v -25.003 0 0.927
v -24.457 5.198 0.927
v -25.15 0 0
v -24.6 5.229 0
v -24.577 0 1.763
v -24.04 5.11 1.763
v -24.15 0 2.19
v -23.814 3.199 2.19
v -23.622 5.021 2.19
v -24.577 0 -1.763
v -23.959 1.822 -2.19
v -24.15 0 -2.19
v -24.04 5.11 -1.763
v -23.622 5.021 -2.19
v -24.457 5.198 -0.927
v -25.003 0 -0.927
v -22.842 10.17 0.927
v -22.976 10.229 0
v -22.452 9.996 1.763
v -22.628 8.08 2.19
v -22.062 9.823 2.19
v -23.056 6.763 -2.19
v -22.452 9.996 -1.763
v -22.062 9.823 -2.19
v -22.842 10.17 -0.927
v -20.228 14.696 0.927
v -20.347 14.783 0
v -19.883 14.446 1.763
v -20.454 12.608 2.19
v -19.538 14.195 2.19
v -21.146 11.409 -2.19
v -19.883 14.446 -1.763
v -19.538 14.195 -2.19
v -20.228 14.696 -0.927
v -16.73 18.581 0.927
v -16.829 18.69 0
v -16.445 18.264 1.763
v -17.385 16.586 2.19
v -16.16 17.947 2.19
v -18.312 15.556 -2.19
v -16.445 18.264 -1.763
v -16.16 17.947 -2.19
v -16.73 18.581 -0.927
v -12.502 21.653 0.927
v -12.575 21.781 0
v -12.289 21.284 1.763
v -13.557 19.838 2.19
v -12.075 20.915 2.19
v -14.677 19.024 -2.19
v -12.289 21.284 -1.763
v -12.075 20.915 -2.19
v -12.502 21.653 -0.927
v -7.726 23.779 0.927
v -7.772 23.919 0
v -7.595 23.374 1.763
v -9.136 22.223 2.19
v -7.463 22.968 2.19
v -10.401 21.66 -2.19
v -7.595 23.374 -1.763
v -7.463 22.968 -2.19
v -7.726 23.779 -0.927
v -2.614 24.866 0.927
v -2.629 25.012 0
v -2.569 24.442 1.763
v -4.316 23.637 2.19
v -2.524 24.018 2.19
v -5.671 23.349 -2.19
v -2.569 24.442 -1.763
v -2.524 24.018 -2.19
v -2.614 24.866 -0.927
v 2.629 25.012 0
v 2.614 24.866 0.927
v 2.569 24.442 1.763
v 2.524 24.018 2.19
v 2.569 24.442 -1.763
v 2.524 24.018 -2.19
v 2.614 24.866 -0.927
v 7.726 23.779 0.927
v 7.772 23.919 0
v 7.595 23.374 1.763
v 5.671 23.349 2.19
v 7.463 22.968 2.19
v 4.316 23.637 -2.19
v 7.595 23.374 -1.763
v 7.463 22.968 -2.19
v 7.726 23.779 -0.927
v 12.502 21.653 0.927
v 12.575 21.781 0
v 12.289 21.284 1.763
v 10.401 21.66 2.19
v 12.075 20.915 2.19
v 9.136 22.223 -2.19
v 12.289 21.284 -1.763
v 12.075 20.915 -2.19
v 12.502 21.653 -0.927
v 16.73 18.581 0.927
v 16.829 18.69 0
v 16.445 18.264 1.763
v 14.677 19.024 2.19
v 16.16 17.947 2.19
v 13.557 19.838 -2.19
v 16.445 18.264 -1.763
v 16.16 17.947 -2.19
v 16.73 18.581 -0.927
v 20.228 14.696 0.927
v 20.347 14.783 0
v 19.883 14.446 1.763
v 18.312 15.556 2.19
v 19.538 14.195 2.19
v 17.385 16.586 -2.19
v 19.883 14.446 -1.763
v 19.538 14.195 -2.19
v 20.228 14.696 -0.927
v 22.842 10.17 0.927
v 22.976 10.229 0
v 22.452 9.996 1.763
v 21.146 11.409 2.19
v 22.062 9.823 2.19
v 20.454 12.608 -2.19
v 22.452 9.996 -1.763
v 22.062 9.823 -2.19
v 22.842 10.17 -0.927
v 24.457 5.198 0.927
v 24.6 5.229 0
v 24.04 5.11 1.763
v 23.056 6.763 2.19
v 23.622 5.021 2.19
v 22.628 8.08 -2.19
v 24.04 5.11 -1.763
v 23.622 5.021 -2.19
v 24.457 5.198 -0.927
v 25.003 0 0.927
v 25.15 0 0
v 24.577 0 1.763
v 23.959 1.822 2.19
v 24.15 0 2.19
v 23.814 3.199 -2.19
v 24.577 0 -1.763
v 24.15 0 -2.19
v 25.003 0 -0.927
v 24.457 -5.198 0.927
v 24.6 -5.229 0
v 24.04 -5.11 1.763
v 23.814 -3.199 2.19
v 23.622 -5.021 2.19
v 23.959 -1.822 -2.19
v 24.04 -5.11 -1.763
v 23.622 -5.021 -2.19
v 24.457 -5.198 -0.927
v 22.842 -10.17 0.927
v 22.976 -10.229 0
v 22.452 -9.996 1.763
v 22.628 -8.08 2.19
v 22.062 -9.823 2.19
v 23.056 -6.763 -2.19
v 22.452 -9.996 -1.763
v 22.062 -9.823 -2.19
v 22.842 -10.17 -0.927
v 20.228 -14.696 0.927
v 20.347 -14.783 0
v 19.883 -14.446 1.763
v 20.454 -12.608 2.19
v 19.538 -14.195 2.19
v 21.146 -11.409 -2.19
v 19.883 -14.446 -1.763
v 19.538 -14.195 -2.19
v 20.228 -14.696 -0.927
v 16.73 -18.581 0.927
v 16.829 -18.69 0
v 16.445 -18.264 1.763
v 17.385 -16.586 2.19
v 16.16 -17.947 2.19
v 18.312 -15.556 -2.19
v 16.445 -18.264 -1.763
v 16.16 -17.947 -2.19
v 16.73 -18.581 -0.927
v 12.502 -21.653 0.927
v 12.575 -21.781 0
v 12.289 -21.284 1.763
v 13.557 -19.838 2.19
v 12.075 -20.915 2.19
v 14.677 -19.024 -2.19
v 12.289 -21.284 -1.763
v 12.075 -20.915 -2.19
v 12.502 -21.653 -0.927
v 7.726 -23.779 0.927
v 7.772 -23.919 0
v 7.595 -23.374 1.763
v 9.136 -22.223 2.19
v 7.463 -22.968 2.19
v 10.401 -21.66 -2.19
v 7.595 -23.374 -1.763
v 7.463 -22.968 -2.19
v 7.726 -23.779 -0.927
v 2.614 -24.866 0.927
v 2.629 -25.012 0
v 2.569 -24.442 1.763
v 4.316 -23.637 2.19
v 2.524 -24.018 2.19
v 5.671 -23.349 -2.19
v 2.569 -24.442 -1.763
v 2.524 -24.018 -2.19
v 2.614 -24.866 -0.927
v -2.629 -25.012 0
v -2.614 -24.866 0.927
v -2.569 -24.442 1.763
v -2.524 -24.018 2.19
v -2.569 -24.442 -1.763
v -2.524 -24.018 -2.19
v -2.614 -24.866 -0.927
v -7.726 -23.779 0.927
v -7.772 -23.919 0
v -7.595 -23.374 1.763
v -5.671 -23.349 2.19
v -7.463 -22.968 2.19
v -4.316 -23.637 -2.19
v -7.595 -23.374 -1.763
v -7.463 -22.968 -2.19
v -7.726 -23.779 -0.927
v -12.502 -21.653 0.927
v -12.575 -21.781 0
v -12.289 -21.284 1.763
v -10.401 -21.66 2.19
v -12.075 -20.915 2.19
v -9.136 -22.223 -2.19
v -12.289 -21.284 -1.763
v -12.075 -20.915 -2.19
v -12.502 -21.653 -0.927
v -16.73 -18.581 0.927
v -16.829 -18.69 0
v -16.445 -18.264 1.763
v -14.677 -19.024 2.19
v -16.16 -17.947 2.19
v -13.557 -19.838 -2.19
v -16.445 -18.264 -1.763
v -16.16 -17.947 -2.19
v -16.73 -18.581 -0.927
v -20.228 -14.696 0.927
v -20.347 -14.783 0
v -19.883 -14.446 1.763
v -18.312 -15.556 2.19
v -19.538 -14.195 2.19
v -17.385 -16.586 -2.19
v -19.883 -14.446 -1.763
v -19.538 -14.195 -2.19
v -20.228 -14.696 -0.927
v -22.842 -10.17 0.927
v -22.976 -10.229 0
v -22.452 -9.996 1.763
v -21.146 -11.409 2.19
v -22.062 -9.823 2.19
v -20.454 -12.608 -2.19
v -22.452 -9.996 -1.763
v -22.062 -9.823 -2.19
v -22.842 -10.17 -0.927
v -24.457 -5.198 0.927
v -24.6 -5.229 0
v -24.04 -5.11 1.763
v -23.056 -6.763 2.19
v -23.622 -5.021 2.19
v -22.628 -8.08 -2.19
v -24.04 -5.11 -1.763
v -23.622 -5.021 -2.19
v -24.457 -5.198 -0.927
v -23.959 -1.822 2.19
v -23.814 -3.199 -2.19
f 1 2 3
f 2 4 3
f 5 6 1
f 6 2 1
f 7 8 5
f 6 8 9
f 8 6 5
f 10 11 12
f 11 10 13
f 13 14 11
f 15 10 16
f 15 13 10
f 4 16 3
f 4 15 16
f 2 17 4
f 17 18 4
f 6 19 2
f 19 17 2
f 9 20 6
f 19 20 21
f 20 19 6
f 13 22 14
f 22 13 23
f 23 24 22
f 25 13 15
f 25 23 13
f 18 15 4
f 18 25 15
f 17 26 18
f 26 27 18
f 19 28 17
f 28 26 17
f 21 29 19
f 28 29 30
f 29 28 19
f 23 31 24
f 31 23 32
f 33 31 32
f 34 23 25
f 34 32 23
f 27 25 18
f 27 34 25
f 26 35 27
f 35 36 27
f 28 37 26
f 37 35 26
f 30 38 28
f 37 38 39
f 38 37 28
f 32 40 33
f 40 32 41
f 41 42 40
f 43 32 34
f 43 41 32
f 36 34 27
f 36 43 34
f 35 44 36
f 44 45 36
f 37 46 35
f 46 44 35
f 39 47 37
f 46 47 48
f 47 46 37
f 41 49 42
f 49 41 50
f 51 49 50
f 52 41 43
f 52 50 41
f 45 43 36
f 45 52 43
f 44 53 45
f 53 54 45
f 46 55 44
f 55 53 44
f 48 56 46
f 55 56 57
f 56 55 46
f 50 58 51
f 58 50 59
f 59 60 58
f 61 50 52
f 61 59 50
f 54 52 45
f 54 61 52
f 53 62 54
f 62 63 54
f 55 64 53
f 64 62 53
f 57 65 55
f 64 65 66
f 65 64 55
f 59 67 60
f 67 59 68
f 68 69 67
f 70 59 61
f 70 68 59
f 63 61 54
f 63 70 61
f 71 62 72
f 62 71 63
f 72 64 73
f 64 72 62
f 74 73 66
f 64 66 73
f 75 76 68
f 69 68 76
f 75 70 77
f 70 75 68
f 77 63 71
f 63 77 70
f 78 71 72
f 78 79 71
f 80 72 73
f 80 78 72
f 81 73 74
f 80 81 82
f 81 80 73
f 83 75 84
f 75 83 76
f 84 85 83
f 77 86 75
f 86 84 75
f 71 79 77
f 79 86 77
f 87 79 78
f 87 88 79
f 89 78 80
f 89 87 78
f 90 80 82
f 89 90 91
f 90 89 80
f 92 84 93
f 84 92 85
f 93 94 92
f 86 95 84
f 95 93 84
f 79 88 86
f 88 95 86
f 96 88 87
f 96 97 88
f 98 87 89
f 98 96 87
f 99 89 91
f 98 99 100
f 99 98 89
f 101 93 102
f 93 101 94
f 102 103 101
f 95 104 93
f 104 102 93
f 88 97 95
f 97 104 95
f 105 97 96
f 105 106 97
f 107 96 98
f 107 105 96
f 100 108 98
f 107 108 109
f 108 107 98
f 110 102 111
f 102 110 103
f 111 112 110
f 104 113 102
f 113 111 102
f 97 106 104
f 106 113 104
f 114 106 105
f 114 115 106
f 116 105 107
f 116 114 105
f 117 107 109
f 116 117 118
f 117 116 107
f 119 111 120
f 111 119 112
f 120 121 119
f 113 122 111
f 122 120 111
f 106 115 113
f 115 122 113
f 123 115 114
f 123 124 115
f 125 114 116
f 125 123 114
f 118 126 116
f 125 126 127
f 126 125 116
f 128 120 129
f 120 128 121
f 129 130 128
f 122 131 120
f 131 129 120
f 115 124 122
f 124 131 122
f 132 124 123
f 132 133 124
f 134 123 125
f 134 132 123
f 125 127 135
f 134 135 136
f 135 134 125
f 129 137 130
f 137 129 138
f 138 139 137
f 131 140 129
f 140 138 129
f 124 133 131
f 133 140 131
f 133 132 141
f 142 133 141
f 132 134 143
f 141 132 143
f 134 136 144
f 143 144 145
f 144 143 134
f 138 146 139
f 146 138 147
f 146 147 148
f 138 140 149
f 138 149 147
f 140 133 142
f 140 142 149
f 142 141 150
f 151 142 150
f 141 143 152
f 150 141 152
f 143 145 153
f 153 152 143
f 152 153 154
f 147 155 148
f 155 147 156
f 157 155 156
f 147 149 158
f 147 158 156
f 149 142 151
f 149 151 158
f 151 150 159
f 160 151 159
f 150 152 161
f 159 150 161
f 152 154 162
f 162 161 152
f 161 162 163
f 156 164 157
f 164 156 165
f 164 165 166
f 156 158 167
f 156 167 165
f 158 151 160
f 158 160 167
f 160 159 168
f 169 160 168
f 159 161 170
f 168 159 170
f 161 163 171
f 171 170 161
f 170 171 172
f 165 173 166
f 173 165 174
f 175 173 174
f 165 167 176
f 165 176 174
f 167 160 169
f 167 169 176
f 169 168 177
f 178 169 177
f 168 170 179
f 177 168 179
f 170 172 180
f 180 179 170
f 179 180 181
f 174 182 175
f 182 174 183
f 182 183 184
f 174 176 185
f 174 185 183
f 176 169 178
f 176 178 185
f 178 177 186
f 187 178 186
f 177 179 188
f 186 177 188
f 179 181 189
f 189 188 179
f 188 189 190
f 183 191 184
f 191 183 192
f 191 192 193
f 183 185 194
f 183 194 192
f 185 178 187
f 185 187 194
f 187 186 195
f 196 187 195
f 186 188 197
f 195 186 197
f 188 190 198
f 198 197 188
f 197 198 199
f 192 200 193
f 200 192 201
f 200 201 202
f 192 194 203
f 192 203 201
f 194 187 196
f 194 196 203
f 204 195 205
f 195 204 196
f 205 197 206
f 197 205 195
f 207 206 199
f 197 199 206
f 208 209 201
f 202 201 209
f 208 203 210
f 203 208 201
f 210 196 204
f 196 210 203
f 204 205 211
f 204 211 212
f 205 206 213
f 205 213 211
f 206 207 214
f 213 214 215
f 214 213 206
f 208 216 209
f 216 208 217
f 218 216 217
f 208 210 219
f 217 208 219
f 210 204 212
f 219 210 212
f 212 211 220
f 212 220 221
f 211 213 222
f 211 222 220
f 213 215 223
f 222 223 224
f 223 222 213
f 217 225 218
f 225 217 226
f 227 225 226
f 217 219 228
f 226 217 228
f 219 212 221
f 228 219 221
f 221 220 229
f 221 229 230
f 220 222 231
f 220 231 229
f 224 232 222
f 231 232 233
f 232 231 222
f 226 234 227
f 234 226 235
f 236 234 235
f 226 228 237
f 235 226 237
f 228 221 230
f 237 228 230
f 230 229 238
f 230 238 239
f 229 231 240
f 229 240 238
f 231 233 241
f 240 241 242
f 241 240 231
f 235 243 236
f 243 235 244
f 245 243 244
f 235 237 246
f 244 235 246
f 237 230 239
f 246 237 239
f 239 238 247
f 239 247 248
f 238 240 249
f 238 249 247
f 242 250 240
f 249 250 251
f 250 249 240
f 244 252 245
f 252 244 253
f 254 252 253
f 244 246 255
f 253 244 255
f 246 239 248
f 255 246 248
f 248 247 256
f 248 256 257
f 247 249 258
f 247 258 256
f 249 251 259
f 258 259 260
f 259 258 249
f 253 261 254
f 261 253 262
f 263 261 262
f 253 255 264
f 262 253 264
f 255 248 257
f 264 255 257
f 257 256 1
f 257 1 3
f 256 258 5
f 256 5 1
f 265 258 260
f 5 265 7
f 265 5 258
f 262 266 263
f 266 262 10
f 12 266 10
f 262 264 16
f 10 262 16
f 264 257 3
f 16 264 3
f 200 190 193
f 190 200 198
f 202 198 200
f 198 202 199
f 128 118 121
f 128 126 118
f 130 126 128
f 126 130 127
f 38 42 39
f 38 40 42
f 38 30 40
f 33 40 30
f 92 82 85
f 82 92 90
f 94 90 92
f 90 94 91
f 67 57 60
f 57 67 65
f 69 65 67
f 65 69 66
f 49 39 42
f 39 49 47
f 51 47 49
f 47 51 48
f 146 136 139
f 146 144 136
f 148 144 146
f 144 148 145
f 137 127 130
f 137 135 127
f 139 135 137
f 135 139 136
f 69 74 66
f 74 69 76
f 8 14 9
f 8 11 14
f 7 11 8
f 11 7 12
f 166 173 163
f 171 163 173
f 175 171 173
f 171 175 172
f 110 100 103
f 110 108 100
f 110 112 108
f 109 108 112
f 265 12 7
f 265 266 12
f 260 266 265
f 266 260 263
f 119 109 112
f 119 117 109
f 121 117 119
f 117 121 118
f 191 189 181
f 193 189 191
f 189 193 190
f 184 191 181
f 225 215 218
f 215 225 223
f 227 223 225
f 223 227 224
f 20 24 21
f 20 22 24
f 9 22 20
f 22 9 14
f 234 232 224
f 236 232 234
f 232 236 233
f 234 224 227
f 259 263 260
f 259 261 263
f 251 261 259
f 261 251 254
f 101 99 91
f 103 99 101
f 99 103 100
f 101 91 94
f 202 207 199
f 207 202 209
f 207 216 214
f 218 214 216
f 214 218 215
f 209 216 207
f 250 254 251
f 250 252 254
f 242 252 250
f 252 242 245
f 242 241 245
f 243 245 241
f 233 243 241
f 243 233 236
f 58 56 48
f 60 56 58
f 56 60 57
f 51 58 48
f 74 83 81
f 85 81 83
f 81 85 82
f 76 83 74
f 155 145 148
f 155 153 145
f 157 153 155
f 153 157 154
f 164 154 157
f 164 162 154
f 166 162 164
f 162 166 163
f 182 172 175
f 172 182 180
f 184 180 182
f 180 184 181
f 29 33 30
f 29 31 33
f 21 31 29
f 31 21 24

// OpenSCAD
weldprep();
module weldprep(d=48.3,r=3){
    difference(){
        rotate_extrude()translate([(d-4)/2,0,0])circle(r,$fn=20);
        cylinder(h=8,d=d,center=true);
    }
}
